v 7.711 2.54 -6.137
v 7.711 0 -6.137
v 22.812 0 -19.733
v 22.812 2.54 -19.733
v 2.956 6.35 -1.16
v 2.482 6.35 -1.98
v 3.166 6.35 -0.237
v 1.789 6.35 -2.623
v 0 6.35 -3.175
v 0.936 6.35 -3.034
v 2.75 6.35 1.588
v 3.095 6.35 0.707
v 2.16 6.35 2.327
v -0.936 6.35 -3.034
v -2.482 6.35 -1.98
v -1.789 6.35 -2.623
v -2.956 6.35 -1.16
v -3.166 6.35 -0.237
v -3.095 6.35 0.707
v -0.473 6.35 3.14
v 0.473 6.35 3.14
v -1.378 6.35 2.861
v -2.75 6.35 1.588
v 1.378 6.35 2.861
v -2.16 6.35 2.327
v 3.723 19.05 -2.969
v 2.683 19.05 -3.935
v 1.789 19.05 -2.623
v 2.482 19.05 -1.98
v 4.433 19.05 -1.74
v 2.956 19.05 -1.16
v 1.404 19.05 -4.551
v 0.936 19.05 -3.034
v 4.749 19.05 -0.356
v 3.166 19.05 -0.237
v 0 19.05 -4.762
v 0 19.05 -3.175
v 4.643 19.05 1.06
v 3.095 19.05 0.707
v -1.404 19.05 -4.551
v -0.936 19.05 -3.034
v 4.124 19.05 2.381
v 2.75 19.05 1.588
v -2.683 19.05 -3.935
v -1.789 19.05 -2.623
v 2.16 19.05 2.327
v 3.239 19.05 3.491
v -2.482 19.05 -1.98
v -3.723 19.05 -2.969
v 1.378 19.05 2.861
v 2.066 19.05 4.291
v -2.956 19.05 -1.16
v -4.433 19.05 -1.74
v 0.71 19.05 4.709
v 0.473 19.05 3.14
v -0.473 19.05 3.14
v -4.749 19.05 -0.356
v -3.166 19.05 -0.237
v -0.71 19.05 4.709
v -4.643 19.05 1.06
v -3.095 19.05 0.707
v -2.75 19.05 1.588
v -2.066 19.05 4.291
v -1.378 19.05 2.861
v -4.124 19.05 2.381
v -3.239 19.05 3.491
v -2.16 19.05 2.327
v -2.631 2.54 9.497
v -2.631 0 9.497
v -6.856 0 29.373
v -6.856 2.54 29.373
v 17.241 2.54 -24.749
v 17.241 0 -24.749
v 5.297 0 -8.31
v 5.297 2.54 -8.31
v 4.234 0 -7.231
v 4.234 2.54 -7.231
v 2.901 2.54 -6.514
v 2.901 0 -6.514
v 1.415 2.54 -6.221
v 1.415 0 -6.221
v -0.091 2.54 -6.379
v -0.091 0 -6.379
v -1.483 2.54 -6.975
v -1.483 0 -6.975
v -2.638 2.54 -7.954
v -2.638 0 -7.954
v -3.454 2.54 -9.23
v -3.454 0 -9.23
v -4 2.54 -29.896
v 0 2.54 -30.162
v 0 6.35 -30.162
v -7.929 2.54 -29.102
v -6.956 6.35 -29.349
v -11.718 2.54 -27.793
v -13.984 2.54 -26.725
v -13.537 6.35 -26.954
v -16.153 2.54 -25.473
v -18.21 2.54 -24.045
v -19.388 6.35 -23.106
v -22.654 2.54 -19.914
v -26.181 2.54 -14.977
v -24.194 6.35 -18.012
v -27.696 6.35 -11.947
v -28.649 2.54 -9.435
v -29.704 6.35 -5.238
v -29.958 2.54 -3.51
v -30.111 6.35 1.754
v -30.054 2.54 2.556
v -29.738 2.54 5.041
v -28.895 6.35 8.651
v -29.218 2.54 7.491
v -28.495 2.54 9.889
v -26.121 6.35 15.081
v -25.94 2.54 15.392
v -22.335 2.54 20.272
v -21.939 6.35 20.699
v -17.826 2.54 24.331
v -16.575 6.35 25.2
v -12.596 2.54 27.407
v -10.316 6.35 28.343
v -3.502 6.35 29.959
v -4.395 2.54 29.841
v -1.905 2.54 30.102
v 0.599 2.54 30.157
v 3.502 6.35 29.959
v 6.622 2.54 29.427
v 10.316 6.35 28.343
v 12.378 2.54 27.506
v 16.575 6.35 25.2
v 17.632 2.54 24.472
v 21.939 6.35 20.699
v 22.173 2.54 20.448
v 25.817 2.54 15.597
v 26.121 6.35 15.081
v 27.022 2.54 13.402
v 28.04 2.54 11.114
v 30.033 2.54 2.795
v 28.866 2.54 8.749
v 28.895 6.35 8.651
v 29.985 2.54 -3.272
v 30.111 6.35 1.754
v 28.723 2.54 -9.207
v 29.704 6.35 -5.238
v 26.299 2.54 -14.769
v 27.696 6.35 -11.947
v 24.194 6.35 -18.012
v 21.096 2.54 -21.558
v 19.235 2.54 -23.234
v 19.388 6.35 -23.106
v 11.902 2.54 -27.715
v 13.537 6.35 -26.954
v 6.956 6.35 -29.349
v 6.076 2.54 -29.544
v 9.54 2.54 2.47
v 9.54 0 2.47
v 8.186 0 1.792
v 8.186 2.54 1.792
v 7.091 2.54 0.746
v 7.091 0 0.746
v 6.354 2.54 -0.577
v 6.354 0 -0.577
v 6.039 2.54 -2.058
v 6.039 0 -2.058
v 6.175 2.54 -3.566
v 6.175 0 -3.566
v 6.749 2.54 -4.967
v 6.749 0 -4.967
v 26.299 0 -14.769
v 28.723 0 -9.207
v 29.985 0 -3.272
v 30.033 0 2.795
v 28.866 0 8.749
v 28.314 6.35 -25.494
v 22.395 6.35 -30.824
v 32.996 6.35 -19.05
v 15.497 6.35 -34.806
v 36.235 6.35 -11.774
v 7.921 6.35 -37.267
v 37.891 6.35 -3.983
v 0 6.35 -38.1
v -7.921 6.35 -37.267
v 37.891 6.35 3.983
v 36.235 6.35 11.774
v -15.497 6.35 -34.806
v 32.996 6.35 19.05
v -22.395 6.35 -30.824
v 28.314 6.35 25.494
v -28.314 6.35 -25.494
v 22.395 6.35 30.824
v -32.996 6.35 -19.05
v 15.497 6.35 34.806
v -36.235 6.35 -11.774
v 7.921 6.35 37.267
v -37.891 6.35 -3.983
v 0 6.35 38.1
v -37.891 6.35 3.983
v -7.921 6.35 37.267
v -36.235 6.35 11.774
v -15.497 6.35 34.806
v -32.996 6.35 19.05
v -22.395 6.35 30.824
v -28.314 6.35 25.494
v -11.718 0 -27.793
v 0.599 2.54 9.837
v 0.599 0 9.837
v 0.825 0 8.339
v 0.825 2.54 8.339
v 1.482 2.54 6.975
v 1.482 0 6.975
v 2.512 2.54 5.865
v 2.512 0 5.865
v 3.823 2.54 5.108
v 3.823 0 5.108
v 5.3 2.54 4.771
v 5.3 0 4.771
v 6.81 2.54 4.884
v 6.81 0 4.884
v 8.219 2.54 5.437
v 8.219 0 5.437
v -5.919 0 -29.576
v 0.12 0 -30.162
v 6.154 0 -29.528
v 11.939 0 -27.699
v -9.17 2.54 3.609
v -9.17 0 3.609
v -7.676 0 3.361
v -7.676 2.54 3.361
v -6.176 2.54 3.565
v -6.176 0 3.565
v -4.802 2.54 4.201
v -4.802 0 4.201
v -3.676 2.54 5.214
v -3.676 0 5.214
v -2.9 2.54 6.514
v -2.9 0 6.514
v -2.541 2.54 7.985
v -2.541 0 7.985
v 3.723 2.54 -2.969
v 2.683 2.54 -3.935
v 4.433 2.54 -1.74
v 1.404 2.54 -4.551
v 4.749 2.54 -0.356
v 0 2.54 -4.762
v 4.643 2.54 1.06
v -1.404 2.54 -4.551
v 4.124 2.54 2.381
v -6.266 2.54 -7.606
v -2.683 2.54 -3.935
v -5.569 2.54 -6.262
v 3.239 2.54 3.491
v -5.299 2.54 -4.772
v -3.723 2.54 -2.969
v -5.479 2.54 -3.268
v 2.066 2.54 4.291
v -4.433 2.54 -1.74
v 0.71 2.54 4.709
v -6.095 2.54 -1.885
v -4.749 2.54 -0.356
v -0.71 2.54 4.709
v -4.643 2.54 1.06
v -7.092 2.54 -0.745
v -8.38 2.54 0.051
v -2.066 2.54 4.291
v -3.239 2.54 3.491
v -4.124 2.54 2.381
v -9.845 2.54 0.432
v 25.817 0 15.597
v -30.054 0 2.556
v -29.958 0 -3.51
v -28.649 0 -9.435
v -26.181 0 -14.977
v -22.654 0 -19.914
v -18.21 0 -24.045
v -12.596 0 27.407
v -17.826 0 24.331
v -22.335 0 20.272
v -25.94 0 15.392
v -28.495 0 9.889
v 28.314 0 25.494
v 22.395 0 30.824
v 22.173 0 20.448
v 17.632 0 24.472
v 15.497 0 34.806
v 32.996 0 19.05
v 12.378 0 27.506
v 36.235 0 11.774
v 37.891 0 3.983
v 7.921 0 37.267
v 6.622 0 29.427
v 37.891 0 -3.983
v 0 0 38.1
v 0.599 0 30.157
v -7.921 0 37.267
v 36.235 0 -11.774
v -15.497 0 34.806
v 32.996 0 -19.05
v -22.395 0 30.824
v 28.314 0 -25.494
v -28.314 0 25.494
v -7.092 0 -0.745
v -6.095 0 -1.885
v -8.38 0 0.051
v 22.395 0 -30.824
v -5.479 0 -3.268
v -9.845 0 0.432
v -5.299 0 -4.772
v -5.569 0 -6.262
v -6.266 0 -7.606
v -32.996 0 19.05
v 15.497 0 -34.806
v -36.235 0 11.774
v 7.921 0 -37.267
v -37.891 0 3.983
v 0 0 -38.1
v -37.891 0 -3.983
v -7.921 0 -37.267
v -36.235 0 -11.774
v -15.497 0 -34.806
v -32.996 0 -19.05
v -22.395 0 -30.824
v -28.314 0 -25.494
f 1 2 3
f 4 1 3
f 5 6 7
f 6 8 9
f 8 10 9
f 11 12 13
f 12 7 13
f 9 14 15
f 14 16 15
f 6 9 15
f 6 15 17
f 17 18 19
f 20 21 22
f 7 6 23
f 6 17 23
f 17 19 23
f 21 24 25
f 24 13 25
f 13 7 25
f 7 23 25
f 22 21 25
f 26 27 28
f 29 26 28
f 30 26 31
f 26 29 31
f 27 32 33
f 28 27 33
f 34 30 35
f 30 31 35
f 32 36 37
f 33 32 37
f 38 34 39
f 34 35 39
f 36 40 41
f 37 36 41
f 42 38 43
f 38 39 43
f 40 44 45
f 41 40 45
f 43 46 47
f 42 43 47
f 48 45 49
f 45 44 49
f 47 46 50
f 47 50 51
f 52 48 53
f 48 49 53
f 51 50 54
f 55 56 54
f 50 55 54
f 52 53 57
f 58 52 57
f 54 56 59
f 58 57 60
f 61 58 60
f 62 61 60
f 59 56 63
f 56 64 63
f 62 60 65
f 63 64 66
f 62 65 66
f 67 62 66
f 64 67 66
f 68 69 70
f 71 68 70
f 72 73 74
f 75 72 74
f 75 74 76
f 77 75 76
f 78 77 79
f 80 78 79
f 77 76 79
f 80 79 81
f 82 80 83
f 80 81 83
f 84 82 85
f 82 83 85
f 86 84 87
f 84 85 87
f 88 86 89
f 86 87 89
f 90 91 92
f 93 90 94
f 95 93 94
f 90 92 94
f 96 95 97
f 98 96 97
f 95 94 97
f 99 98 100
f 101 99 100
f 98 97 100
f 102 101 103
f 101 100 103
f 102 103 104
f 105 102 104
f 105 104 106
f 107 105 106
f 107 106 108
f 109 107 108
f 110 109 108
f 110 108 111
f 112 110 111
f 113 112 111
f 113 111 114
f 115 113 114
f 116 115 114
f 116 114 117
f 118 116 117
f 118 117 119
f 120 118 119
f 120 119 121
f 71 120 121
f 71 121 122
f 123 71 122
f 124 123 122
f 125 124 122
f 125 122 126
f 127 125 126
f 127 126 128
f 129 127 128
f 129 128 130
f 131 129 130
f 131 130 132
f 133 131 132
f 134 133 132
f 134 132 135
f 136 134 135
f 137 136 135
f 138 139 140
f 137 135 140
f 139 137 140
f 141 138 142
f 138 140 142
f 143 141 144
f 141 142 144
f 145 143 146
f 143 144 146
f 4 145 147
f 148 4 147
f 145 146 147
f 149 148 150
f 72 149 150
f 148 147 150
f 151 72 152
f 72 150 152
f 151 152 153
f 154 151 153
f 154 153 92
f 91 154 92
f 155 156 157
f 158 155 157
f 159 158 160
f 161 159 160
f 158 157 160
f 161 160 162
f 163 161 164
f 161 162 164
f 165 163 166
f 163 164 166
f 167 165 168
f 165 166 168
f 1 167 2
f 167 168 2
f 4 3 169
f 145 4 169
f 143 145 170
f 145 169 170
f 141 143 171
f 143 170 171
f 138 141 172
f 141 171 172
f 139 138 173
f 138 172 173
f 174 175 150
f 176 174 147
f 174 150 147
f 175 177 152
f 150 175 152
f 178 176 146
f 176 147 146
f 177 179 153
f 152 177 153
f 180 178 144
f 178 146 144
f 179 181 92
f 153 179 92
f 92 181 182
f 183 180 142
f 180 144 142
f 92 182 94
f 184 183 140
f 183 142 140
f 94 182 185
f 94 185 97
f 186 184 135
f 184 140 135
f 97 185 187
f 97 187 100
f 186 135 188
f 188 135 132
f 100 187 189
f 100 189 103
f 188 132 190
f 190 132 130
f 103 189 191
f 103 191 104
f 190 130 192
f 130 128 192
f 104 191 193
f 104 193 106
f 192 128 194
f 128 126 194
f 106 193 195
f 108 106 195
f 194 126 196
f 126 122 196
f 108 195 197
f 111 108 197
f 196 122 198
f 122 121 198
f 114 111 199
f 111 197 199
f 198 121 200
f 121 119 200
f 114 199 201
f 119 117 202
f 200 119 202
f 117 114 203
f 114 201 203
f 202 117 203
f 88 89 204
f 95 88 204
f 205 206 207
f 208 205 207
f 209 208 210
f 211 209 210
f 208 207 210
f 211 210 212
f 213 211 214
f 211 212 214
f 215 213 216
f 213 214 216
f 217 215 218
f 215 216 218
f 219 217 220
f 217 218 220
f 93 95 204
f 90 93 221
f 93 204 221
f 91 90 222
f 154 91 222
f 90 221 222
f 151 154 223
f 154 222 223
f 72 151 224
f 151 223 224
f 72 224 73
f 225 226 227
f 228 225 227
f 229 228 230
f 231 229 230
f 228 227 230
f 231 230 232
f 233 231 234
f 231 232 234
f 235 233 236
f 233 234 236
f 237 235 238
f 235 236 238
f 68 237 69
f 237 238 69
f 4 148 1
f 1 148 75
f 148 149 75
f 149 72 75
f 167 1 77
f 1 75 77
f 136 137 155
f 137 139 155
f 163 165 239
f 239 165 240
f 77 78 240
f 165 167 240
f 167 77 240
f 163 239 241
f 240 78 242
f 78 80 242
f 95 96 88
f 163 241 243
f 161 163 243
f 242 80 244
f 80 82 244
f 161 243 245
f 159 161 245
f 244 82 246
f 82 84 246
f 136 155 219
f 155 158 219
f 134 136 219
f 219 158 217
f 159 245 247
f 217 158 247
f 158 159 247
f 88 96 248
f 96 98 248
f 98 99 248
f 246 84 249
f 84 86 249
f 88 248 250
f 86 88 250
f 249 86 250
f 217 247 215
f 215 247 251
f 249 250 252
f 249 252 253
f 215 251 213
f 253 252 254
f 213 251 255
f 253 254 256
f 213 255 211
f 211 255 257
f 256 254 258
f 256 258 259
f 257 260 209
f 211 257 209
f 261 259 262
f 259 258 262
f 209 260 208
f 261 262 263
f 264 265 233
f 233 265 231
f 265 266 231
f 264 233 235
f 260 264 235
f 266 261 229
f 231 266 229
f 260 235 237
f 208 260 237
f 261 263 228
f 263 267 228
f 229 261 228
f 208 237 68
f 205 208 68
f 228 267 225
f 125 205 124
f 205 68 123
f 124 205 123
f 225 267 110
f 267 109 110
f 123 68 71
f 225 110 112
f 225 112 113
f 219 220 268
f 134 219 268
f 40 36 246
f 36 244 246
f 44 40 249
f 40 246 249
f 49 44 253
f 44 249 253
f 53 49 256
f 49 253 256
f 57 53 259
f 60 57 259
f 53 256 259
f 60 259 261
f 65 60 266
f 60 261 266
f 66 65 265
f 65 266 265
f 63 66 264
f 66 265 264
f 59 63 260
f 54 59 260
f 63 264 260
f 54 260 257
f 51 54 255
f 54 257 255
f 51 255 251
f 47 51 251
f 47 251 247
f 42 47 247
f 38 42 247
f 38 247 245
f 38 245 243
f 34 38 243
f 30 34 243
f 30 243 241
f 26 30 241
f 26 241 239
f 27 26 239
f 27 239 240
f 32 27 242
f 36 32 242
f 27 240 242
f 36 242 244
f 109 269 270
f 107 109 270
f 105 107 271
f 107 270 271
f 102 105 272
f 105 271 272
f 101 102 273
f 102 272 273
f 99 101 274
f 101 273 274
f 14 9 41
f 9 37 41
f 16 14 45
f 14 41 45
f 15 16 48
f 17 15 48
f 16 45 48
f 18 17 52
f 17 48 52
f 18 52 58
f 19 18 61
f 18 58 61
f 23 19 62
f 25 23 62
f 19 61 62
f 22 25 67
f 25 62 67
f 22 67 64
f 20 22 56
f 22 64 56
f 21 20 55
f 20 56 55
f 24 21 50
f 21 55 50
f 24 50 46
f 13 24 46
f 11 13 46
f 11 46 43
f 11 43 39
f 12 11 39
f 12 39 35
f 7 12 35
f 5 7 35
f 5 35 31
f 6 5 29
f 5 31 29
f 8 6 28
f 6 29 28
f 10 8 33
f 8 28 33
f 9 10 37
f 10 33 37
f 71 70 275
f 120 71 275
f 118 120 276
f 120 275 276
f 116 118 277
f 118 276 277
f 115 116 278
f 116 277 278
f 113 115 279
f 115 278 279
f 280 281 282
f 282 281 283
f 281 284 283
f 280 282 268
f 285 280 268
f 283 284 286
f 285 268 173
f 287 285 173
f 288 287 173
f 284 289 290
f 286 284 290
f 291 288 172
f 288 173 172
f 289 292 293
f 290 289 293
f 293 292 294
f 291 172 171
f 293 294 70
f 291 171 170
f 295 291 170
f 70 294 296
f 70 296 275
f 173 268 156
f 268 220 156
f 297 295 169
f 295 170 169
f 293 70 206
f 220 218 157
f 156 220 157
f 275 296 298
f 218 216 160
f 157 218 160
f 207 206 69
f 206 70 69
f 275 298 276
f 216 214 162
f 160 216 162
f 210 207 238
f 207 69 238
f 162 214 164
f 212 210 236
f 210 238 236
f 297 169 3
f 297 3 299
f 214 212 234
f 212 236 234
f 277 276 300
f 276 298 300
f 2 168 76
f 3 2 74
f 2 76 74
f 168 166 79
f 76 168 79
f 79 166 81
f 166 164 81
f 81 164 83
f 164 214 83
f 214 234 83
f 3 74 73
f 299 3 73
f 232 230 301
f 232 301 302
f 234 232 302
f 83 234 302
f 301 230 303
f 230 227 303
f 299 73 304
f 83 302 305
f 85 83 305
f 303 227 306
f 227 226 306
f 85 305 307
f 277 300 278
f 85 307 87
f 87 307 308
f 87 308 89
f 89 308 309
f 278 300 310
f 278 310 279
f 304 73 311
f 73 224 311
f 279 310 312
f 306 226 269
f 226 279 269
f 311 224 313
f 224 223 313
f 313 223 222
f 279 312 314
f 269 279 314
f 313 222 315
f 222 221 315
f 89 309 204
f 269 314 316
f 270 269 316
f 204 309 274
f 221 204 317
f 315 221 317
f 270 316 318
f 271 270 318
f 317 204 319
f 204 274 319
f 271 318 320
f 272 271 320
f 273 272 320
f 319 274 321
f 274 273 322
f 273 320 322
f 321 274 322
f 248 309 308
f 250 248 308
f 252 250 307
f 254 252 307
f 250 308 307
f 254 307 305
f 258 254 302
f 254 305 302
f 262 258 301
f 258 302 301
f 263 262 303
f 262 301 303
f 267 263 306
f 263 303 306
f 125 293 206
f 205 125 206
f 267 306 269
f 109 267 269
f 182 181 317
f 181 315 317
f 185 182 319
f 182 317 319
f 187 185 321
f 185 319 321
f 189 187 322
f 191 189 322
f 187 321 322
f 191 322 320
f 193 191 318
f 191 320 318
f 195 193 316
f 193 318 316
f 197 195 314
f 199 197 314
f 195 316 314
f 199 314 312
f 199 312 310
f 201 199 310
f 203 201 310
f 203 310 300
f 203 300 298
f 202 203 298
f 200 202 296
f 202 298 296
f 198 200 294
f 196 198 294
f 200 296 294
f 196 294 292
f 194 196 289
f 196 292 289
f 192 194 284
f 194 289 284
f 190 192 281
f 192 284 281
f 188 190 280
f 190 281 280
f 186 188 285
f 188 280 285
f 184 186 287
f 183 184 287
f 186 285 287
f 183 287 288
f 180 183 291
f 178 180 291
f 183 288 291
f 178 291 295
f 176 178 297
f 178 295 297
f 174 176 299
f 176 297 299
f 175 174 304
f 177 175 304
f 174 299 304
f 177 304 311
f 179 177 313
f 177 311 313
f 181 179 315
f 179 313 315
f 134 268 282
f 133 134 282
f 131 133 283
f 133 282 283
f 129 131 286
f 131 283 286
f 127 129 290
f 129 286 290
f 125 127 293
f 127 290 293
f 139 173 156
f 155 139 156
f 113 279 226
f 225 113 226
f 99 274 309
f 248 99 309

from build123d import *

# Parameters (mm, degrees)
CUT_EXTRUDE1_DEPTH = 58.15
CIRPATTERN1_COUNT  = 5


with BuildPart() as part:
    # Sketch1 → Revolve1 (revolve)
    with BuildSketch(Plane.XY):
        Polygon((38.1, 6.35), (38.1, 0), (0, 0), (0, 6.35), (3.175, 6.35), (3.175, 19.05), (4.7625, 19.05), (4.7625, 2.54), (30.1625, 2.54), (30.1625, 6.35), align=None)
    revolve(axis=Axis((0, 0, 0), (0, 1, 0)))

    # Sketch2 → Cut-Extrude1 (cut, through all)
    with BuildSketch(Plane.XZ):
        with BuildLine():
            Line((0.599134, 30.156549), (0.599134, 9.836549))
            ThreePointArc((0.599134, 9.836549), (3.139134, 5.43714), (8.219134, 5.43714))
            Line((8.219134, 5.43714), (25.81677, 15.59714))
            ThreePointArc((25.81677, 15.59714), (15.08125, 26.121491), (0.599134, 30.156549))
        make_face()
    cut_extrude1 = extrude(amount=-CUT_EXTRUDE1_DEPTH, mode=Mode.SUBTRACT)

    # CirPattern1: Cut-Extrude1 ×5 about axis
    cirpattern1_axis = Axis((0, -1.42875, 0), (0, 1, 0))
    for i in range(1, CIRPATTERN1_COUNT):
        add(cut_extrude1.rotate(cirpattern1_axis, i * 360 / CIRPATTERN1_COUNT), mode=Mode.SUBTRACT)


solid = part.part
